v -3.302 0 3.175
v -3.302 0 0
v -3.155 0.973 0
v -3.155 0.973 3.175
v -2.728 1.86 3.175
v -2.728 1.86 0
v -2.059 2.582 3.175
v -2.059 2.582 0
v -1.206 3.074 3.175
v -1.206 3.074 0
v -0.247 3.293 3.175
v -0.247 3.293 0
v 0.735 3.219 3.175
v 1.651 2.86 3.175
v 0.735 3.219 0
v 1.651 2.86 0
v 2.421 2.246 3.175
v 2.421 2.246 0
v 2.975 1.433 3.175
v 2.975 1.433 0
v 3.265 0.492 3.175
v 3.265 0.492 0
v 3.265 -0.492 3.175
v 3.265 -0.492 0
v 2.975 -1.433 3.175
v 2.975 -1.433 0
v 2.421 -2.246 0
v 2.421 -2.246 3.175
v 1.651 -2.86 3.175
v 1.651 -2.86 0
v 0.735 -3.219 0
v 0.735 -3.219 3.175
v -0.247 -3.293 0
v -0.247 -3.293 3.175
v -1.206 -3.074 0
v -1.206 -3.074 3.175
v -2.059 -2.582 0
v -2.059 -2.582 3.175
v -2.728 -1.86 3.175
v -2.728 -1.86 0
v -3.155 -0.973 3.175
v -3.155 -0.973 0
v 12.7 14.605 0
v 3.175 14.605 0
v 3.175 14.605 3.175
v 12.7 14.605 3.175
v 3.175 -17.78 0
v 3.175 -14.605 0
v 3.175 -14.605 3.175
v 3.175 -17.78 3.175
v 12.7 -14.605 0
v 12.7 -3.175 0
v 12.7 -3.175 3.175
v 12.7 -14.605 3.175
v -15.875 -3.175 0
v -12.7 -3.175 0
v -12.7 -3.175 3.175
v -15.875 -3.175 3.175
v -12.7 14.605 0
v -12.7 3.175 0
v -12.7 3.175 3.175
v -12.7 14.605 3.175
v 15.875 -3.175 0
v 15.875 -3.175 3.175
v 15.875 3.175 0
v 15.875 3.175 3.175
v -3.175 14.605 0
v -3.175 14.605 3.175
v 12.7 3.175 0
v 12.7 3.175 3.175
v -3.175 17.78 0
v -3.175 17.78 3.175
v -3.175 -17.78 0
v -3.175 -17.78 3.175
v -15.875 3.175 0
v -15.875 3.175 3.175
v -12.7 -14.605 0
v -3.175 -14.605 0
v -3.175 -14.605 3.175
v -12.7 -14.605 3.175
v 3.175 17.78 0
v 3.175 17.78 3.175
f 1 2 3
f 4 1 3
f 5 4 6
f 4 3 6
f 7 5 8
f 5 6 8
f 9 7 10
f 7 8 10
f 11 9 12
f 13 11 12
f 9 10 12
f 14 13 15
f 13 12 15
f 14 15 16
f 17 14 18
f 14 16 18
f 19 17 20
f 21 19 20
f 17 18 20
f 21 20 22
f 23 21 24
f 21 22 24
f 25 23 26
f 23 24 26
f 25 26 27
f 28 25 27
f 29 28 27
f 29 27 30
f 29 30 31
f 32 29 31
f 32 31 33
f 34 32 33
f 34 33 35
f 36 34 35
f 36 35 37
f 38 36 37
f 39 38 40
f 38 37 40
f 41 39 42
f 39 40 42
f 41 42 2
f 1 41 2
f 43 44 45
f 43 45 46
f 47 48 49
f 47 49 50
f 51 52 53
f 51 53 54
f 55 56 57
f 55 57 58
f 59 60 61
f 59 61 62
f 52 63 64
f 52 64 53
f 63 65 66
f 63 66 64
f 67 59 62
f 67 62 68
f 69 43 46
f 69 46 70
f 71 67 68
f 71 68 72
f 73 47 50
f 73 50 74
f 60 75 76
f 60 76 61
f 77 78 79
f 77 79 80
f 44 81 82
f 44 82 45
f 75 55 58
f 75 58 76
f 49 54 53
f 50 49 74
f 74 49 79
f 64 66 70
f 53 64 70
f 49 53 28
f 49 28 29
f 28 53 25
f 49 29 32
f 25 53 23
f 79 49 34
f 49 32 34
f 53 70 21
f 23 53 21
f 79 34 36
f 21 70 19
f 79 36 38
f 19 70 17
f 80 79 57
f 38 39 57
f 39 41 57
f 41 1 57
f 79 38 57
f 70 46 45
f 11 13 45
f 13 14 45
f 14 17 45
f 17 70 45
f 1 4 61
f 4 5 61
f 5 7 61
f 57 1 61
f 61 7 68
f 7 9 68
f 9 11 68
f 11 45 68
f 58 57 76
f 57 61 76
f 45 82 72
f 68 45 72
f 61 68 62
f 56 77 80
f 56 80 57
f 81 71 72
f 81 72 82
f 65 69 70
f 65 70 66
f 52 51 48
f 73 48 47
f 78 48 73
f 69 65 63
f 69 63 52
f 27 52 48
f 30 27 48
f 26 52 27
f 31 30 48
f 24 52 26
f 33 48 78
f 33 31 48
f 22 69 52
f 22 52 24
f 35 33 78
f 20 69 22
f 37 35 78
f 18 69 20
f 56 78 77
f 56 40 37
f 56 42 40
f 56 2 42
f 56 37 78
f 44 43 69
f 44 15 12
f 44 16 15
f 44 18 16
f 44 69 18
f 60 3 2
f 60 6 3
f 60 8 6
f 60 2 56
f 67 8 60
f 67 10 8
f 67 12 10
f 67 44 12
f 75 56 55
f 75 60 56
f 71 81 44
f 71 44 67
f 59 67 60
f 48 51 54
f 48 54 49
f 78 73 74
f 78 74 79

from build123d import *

# Parameters (mm, degrees)
EXTRUDE1_DEPTH     = 3.175
SKETCH2_R          = 3.302
CUT_EXTRUDE1_DEPTH = 3.175


with BuildPart() as part:
    # Sketch1 → Extrude1 (new body)
    with BuildSketch(Plane.XY):
        Polygon((-12.7, 14.605), (-3.175, 14.605), (-3.175, 17.78), (3.175, 17.78), (3.175, 14.605), (12.7, 14.605), (12.7, 3.175), (15.875, 3.175), (15.875, -3.175), (12.7, -3.175), (12.7, -14.605), (3.175, -14.605), (3.175, -17.78), (-3.175, -17.78), (-3.175, -14.605), (-12.7, -14.605), (-12.7, -3.175), (-15.875, -3.175), (-15.875, 3.175), (-12.7, 3.175), align=None)
    extrude(amount=EXTRUDE1_DEPTH)

    # Sketch2 → Cut-Extrude1 (cut)
    with BuildSketch(Plane(origin=(0, 0, 0), x_dir=(-1, 0, 0), z_dir=(0, 0, -1))):
        Circle(SKETCH2_R)
    extrude(amount=-CUT_EXTRUDE1_DEPTH, mode=Mode.SUBTRACT)


solid = part.part
